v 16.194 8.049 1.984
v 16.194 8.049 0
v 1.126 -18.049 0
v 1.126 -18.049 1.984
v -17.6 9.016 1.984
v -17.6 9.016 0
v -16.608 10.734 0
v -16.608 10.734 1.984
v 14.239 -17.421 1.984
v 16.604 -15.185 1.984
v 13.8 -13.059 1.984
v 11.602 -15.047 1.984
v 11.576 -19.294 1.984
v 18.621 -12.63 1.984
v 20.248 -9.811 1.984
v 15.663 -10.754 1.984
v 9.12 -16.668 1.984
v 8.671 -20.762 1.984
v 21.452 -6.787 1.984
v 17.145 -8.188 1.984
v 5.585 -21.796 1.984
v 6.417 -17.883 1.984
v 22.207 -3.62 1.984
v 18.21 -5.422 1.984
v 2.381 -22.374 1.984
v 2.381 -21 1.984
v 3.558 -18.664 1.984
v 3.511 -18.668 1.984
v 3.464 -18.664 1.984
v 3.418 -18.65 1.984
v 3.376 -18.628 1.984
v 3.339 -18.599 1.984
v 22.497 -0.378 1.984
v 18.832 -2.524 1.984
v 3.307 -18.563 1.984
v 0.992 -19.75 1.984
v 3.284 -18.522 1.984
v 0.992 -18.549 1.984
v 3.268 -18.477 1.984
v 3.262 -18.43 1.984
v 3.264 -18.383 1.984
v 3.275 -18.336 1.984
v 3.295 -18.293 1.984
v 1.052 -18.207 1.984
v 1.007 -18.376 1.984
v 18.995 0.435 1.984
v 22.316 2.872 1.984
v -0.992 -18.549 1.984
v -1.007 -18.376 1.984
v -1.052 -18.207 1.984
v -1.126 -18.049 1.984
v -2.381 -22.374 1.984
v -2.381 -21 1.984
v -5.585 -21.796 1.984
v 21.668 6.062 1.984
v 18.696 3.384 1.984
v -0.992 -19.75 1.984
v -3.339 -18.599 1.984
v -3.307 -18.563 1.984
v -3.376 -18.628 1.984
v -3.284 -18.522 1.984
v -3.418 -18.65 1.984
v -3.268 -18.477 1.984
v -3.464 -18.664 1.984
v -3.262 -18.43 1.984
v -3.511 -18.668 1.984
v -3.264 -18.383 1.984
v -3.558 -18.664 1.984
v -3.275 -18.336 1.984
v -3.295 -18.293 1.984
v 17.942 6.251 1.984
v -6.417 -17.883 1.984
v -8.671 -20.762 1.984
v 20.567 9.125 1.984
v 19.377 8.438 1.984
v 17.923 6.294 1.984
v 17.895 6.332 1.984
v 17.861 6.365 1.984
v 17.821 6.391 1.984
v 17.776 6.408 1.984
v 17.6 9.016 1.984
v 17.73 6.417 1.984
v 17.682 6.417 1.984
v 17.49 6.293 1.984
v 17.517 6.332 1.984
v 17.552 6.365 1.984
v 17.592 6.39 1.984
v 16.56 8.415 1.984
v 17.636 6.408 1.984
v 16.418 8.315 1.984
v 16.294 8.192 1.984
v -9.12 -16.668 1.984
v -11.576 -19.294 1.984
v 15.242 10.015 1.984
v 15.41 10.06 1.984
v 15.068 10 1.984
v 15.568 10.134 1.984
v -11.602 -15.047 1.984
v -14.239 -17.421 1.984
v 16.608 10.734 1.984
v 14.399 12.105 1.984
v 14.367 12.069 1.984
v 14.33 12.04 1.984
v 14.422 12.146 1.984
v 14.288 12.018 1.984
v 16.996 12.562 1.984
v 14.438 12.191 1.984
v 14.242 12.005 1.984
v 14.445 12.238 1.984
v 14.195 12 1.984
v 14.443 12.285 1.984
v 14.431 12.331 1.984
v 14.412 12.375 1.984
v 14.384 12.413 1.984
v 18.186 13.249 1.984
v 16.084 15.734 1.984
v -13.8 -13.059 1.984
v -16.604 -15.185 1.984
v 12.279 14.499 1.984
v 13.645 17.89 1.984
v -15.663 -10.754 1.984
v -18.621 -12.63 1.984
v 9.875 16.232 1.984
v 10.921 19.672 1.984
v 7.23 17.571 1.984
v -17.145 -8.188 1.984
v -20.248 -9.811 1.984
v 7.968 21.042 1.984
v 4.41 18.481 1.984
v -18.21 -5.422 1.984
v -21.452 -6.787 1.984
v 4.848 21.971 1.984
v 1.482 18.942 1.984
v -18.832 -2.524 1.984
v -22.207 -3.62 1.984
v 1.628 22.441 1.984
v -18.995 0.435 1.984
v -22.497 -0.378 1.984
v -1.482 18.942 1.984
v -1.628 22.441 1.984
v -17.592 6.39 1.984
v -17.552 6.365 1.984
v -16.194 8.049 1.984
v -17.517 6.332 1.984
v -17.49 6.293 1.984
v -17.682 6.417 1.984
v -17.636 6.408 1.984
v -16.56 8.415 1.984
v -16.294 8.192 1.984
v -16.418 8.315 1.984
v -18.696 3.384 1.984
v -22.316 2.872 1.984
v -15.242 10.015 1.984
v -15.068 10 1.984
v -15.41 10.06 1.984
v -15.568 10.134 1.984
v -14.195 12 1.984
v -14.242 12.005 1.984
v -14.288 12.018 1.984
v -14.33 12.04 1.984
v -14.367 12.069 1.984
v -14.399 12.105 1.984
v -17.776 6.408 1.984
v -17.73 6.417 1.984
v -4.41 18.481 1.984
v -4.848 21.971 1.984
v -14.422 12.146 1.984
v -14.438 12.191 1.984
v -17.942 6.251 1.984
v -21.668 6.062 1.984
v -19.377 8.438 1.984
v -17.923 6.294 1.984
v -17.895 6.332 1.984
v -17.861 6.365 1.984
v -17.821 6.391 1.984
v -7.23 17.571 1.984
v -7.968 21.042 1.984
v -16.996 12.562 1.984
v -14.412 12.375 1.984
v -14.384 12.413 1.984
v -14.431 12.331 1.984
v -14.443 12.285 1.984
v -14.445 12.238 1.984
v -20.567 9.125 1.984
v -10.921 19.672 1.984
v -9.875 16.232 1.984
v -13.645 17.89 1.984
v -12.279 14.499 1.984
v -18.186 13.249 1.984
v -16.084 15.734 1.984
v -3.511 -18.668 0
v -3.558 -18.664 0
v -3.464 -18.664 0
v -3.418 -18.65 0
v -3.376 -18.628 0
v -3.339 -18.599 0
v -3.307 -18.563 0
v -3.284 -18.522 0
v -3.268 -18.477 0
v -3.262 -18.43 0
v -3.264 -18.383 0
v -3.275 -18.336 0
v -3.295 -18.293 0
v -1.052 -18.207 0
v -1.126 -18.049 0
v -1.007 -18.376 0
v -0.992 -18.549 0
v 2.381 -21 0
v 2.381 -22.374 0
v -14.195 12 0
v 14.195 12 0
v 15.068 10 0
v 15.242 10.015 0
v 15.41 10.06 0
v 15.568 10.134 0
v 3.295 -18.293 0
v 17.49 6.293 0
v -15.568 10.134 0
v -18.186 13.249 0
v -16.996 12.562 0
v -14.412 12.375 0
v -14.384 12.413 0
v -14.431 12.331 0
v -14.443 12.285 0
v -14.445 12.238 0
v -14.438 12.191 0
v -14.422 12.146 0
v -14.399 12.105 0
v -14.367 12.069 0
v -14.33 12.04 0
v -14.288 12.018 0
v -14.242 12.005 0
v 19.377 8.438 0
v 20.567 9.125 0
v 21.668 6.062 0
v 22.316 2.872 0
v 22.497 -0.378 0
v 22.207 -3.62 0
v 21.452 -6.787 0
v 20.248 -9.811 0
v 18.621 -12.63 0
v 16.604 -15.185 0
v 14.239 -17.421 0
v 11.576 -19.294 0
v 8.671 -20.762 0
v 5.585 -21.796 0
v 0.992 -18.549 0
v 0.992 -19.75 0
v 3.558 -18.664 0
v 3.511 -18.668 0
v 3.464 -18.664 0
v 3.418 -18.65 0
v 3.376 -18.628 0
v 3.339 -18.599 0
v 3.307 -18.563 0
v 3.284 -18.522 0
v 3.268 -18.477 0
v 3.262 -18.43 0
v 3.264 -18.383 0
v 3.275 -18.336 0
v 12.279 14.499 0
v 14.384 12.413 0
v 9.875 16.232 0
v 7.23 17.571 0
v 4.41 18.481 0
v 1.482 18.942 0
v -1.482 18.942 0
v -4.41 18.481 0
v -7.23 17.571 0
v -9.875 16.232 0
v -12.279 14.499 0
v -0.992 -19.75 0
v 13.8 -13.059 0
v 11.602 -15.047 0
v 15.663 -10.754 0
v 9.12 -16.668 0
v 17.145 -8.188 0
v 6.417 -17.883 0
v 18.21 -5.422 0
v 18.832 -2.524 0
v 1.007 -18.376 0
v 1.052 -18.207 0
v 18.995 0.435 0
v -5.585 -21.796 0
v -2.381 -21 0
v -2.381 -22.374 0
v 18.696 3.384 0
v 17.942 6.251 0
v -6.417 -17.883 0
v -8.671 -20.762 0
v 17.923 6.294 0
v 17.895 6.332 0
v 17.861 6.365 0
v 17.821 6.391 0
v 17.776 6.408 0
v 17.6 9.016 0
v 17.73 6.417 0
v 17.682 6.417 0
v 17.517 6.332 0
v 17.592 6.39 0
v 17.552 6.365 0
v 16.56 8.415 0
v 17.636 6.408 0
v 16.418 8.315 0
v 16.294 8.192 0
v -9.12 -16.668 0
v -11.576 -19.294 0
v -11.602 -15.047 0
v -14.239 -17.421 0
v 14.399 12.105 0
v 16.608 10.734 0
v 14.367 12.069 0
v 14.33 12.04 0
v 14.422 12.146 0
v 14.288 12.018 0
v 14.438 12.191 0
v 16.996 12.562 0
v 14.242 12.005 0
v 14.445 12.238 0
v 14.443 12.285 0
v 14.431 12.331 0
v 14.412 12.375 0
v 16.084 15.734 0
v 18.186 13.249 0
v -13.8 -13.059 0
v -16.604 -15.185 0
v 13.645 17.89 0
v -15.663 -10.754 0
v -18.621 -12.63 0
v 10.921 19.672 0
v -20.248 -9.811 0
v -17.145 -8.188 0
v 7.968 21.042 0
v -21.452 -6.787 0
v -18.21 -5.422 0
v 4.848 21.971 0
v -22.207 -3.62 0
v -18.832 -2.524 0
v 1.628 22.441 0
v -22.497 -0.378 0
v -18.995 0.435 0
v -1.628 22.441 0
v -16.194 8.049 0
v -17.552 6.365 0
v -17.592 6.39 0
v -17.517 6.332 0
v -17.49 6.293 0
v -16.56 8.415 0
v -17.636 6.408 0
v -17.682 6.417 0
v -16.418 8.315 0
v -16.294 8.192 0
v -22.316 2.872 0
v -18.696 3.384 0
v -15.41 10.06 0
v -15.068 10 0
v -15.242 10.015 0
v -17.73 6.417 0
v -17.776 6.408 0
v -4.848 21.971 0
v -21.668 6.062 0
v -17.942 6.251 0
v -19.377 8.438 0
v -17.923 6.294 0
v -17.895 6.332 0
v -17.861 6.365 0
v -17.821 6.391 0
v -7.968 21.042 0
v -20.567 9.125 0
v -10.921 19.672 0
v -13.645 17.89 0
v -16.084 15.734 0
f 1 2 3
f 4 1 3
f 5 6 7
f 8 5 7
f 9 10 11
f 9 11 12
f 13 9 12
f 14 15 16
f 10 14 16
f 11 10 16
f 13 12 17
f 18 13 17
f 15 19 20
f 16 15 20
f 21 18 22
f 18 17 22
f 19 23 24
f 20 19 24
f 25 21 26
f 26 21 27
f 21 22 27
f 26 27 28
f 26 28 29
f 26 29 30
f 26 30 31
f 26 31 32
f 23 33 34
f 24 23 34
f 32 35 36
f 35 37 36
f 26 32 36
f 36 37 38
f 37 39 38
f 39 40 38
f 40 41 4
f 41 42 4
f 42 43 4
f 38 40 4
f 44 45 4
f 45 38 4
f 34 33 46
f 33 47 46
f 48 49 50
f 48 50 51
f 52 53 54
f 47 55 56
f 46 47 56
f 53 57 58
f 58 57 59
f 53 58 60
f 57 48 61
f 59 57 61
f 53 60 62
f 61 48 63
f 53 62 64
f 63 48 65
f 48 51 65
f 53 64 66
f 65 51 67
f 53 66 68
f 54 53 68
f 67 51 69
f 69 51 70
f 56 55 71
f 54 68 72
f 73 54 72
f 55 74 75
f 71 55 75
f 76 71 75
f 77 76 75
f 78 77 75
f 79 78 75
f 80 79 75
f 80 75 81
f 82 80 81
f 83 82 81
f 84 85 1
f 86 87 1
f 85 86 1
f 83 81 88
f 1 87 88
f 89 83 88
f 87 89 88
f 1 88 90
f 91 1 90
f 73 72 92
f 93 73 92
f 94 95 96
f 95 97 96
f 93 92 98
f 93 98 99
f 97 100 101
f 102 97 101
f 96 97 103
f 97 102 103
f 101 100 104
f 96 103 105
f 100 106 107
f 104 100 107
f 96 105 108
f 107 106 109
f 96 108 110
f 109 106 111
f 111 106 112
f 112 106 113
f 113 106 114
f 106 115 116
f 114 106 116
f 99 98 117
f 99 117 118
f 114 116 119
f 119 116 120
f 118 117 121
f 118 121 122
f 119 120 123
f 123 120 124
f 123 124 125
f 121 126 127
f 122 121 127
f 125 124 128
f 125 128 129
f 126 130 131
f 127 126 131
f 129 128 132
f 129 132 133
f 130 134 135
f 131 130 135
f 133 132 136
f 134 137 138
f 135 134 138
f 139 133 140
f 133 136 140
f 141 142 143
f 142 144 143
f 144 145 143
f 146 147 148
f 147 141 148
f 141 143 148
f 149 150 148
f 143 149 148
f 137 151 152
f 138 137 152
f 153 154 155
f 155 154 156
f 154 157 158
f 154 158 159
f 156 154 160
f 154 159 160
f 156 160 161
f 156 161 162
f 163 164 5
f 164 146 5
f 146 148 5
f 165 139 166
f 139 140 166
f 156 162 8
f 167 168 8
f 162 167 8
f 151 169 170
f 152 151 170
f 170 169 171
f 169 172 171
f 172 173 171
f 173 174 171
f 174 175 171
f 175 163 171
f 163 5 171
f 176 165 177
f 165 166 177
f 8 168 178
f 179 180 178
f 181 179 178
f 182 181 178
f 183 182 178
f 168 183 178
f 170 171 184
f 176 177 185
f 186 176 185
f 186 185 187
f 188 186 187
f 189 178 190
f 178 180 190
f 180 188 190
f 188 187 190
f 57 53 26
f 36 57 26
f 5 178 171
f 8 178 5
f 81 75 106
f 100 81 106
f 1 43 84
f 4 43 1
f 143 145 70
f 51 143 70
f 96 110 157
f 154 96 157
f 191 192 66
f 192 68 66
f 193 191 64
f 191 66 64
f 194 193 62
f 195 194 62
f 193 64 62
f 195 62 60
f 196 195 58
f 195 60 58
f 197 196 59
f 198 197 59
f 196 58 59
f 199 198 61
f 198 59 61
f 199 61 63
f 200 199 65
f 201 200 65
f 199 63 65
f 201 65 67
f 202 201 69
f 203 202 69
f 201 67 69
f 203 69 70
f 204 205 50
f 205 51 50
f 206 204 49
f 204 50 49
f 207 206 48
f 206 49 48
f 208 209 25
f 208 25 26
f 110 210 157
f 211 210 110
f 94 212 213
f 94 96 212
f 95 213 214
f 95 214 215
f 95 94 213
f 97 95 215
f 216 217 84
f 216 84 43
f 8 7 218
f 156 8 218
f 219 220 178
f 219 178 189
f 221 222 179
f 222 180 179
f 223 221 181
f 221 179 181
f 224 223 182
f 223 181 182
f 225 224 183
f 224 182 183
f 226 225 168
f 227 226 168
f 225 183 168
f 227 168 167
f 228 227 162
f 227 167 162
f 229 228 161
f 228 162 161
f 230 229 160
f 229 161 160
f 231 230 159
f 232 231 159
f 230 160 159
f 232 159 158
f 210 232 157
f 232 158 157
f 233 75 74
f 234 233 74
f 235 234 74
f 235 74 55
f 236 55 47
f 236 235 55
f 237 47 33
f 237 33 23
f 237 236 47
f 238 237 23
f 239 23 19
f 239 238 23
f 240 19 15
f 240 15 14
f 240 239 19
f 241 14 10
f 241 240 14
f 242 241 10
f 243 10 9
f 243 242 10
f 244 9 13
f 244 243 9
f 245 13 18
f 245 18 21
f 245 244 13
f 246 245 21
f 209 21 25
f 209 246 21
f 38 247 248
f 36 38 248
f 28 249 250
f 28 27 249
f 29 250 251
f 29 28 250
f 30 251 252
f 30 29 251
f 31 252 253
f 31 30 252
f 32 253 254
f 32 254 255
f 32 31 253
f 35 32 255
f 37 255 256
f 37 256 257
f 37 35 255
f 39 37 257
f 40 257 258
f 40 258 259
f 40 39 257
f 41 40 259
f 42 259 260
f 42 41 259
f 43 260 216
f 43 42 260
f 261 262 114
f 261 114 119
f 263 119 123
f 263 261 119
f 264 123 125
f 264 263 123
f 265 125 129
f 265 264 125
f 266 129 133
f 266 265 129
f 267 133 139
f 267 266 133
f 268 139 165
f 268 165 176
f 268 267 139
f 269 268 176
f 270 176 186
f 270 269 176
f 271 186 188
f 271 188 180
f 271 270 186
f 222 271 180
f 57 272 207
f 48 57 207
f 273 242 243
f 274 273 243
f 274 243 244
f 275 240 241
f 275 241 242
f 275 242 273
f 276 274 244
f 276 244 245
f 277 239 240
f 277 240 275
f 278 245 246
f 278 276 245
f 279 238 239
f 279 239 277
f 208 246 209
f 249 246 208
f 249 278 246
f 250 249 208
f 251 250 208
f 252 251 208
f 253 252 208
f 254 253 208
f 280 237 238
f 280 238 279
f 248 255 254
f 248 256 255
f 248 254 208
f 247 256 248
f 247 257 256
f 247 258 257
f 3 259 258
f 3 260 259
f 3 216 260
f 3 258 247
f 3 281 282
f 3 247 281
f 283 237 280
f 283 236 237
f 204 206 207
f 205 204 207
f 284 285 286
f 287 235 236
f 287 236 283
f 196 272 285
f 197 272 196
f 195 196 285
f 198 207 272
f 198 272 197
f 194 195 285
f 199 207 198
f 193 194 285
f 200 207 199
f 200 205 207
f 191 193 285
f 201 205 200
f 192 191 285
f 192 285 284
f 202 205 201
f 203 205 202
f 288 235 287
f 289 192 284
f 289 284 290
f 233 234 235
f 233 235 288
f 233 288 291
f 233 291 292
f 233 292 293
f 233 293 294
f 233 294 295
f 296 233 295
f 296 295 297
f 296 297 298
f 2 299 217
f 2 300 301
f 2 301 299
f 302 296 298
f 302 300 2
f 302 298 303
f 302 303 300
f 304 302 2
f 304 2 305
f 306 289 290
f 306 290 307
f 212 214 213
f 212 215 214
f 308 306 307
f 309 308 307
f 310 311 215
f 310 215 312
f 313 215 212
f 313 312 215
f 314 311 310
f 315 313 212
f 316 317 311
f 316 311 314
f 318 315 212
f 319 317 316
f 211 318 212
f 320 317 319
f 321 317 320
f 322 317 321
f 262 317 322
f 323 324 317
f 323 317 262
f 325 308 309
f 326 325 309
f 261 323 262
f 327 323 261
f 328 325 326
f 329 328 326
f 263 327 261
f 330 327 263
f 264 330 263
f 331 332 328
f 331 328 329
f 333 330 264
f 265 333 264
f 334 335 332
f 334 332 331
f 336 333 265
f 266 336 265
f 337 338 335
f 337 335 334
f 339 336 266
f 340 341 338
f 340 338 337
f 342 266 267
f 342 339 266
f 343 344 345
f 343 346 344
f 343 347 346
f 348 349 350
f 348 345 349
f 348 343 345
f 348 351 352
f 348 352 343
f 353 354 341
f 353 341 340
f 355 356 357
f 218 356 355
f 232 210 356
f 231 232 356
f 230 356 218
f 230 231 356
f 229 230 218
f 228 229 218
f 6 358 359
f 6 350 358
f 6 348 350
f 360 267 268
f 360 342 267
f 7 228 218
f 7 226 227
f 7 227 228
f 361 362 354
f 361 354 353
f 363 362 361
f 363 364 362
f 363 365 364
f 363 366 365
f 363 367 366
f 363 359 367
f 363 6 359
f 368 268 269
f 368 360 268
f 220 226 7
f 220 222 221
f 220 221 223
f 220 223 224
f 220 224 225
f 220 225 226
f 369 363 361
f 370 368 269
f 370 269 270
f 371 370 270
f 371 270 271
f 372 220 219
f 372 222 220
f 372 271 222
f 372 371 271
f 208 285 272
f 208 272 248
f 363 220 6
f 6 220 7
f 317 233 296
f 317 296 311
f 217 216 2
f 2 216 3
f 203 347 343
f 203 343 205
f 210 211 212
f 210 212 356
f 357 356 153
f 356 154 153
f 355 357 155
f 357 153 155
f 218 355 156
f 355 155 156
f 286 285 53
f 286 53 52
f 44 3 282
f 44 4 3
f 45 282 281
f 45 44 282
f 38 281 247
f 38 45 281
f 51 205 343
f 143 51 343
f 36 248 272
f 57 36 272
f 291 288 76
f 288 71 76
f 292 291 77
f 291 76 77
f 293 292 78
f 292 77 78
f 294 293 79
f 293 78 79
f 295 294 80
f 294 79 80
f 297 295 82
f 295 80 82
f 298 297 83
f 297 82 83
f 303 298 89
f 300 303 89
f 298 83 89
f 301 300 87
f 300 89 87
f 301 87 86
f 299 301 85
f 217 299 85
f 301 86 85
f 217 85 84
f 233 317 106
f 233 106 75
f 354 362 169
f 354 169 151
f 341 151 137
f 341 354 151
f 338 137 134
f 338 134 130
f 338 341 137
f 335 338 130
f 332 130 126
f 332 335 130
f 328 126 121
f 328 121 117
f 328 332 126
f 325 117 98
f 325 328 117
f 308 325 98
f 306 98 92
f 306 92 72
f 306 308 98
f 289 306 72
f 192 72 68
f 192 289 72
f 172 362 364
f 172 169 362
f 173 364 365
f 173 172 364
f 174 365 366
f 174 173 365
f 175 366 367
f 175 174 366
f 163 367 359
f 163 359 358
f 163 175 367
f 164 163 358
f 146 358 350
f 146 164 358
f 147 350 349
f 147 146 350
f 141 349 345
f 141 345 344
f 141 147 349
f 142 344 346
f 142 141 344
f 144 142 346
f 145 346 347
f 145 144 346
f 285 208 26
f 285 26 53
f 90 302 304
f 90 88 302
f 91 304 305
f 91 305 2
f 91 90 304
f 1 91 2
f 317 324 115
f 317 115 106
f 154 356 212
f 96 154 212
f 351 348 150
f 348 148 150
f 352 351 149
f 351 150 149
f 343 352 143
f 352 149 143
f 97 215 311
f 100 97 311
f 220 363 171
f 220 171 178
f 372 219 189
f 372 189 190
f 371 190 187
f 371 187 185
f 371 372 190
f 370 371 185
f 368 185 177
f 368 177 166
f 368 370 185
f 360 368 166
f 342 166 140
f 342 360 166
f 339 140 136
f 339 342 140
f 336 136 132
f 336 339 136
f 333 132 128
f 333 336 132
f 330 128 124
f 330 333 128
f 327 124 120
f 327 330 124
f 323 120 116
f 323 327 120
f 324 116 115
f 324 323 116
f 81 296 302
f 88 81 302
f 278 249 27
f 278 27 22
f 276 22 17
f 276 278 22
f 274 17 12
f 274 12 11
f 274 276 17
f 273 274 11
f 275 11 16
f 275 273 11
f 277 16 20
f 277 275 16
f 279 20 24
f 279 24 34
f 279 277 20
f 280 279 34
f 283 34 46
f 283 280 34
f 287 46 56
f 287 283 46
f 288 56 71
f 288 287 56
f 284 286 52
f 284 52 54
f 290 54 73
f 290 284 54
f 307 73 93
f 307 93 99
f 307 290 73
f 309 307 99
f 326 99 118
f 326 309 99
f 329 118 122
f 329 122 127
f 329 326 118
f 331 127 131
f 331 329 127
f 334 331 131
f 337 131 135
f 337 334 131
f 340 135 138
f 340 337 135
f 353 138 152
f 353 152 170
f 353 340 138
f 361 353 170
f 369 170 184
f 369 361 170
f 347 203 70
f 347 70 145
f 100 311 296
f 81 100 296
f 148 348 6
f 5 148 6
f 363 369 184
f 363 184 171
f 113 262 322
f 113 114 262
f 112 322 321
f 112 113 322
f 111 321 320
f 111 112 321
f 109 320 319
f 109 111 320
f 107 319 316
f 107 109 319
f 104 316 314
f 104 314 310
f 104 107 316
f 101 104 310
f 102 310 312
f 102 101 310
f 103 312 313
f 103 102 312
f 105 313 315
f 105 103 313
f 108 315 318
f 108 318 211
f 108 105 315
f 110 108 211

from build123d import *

# Parameters (mm, degrees)
BOSS_EXTRUDE1_DEPTH = 1.984375
FILLET1_R           = 0.25
FILLET2_R           = 1


with BuildPart() as part:
    # Sketch1 → Boss-Extrude1 (new body)
    with BuildSketch(Plane.XY):
        with BuildLine():
            Line((19.377158479, 8.437777007), (20.566763323, 9.124595684))
            ThreePointArc((20.566763323, 9.124595684), (19.485571585, -11.25), (2.38125, -22.373637354))
            Line((2.38125, -22.373637354), (2.38125, -21))
            Line((2.38125, -21), (-2.38125, -21))
            Line((-2.38125, -21), (-2.38125, -22.373637354))
            ThreePointArc((-2.38125, -22.373637354), (-19.485571585, -11.25), (-20.566763323, 9.124595684))
            Line((-20.566763323, 9.124595684), (-19.377158479, 8.437777007))
            Line((-19.377158479, 8.437777007), (-16.995908479, 12.562222993))
            Line((-16.995908479, 12.562222993), (-18.185513323, 13.24904167))
            ThreePointArc((-18.185513323, 13.24904167), (0, 22.5), (18.185513323, 13.24904167))
            Line((18.185513323, 13.24904167), (16.995908479, 12.562222993))
            Line((16.995908479, 12.562222993), (19.377158479, 8.437777007))
        make_face()
        with BuildLine():
            Line((-14.730919863, 12), (14.730919863, 12))
            ThreePointArc((14.730919863, 12), (0, 19), (-14.730919863, 12))
        make_face(mode=Mode.SUBTRACT)
        Polygon((-15.336133076, 10), (15.336133076, 10), (16.607907975, 10.73425958), (17.600095475, 9.01574042), (16.328320576, 8.281480839), (0.9921875, -18.281480839), (0.9921875, -19.75), (-0.9921875, -19.75), (-0.9921875, -18.281480839), (-16.328320576, 8.281480839), (-17.600095475, 9.01574042), (-16.607907975, 10.73425958), align=None, mode=Mode.SUBTRACT)
        with BuildLine():
            Line((-3.026844914, -18.757350822), (-17.757764777, 6.757350822))
            ThreePointArc((-17.757764777, 6.757350822), (-16.454482672, -9.5), (-3.026844914, -18.757350822))
        make_face(mode=Mode.SUBTRACT)
        with BuildLine():
            Line((17.757764777, 6.757350822), (3.026844914, -18.757350822))
            ThreePointArc((3.026844914, -18.757350822), (16.454482672, -9.5), (17.757764777, 6.757350822))
        make_face(mode=Mode.SUBTRACT)
    extrude(amount=BOSS_EXTRUDE1_DEPTH)

    # Fillet1
    fillet1_edges = [part.edges().sort_by_distance(p)[0] for p in [
        (14.730919863, 12, 0.9921875),
        (-14.730919863, 12, 0.9921875),
        (-17.757764777, 6.757350822, 0.9921875),
        (-3.026844914, -18.757350822, 0.9921875),
        (3.026844914, -18.757350822, 0.9921875),
        (17.757764777, 6.757350822, 0.9921875),
    ]]
    fillet(fillet1_edges, radius=FILLET1_R)

    # Fillet2
    fillet2_edges = [part.edges().sort_by_distance(p)[0] for p in [
        (15.336133076, 10, 0.9921875),
        (-15.336133076, 10, 0.9921875),
        (-16.328320576, 8.281480839, 0.9921875),
        (-0.9921875, -18.281480839, 0.9921875),
        (0.9921875, -18.281480839, 0.9921875),
        (16.328320576, 8.281480839, 0.9921875),
    ]]
    fillet(fillet2_edges, radius=FILLET2_R)


solid = part.part
